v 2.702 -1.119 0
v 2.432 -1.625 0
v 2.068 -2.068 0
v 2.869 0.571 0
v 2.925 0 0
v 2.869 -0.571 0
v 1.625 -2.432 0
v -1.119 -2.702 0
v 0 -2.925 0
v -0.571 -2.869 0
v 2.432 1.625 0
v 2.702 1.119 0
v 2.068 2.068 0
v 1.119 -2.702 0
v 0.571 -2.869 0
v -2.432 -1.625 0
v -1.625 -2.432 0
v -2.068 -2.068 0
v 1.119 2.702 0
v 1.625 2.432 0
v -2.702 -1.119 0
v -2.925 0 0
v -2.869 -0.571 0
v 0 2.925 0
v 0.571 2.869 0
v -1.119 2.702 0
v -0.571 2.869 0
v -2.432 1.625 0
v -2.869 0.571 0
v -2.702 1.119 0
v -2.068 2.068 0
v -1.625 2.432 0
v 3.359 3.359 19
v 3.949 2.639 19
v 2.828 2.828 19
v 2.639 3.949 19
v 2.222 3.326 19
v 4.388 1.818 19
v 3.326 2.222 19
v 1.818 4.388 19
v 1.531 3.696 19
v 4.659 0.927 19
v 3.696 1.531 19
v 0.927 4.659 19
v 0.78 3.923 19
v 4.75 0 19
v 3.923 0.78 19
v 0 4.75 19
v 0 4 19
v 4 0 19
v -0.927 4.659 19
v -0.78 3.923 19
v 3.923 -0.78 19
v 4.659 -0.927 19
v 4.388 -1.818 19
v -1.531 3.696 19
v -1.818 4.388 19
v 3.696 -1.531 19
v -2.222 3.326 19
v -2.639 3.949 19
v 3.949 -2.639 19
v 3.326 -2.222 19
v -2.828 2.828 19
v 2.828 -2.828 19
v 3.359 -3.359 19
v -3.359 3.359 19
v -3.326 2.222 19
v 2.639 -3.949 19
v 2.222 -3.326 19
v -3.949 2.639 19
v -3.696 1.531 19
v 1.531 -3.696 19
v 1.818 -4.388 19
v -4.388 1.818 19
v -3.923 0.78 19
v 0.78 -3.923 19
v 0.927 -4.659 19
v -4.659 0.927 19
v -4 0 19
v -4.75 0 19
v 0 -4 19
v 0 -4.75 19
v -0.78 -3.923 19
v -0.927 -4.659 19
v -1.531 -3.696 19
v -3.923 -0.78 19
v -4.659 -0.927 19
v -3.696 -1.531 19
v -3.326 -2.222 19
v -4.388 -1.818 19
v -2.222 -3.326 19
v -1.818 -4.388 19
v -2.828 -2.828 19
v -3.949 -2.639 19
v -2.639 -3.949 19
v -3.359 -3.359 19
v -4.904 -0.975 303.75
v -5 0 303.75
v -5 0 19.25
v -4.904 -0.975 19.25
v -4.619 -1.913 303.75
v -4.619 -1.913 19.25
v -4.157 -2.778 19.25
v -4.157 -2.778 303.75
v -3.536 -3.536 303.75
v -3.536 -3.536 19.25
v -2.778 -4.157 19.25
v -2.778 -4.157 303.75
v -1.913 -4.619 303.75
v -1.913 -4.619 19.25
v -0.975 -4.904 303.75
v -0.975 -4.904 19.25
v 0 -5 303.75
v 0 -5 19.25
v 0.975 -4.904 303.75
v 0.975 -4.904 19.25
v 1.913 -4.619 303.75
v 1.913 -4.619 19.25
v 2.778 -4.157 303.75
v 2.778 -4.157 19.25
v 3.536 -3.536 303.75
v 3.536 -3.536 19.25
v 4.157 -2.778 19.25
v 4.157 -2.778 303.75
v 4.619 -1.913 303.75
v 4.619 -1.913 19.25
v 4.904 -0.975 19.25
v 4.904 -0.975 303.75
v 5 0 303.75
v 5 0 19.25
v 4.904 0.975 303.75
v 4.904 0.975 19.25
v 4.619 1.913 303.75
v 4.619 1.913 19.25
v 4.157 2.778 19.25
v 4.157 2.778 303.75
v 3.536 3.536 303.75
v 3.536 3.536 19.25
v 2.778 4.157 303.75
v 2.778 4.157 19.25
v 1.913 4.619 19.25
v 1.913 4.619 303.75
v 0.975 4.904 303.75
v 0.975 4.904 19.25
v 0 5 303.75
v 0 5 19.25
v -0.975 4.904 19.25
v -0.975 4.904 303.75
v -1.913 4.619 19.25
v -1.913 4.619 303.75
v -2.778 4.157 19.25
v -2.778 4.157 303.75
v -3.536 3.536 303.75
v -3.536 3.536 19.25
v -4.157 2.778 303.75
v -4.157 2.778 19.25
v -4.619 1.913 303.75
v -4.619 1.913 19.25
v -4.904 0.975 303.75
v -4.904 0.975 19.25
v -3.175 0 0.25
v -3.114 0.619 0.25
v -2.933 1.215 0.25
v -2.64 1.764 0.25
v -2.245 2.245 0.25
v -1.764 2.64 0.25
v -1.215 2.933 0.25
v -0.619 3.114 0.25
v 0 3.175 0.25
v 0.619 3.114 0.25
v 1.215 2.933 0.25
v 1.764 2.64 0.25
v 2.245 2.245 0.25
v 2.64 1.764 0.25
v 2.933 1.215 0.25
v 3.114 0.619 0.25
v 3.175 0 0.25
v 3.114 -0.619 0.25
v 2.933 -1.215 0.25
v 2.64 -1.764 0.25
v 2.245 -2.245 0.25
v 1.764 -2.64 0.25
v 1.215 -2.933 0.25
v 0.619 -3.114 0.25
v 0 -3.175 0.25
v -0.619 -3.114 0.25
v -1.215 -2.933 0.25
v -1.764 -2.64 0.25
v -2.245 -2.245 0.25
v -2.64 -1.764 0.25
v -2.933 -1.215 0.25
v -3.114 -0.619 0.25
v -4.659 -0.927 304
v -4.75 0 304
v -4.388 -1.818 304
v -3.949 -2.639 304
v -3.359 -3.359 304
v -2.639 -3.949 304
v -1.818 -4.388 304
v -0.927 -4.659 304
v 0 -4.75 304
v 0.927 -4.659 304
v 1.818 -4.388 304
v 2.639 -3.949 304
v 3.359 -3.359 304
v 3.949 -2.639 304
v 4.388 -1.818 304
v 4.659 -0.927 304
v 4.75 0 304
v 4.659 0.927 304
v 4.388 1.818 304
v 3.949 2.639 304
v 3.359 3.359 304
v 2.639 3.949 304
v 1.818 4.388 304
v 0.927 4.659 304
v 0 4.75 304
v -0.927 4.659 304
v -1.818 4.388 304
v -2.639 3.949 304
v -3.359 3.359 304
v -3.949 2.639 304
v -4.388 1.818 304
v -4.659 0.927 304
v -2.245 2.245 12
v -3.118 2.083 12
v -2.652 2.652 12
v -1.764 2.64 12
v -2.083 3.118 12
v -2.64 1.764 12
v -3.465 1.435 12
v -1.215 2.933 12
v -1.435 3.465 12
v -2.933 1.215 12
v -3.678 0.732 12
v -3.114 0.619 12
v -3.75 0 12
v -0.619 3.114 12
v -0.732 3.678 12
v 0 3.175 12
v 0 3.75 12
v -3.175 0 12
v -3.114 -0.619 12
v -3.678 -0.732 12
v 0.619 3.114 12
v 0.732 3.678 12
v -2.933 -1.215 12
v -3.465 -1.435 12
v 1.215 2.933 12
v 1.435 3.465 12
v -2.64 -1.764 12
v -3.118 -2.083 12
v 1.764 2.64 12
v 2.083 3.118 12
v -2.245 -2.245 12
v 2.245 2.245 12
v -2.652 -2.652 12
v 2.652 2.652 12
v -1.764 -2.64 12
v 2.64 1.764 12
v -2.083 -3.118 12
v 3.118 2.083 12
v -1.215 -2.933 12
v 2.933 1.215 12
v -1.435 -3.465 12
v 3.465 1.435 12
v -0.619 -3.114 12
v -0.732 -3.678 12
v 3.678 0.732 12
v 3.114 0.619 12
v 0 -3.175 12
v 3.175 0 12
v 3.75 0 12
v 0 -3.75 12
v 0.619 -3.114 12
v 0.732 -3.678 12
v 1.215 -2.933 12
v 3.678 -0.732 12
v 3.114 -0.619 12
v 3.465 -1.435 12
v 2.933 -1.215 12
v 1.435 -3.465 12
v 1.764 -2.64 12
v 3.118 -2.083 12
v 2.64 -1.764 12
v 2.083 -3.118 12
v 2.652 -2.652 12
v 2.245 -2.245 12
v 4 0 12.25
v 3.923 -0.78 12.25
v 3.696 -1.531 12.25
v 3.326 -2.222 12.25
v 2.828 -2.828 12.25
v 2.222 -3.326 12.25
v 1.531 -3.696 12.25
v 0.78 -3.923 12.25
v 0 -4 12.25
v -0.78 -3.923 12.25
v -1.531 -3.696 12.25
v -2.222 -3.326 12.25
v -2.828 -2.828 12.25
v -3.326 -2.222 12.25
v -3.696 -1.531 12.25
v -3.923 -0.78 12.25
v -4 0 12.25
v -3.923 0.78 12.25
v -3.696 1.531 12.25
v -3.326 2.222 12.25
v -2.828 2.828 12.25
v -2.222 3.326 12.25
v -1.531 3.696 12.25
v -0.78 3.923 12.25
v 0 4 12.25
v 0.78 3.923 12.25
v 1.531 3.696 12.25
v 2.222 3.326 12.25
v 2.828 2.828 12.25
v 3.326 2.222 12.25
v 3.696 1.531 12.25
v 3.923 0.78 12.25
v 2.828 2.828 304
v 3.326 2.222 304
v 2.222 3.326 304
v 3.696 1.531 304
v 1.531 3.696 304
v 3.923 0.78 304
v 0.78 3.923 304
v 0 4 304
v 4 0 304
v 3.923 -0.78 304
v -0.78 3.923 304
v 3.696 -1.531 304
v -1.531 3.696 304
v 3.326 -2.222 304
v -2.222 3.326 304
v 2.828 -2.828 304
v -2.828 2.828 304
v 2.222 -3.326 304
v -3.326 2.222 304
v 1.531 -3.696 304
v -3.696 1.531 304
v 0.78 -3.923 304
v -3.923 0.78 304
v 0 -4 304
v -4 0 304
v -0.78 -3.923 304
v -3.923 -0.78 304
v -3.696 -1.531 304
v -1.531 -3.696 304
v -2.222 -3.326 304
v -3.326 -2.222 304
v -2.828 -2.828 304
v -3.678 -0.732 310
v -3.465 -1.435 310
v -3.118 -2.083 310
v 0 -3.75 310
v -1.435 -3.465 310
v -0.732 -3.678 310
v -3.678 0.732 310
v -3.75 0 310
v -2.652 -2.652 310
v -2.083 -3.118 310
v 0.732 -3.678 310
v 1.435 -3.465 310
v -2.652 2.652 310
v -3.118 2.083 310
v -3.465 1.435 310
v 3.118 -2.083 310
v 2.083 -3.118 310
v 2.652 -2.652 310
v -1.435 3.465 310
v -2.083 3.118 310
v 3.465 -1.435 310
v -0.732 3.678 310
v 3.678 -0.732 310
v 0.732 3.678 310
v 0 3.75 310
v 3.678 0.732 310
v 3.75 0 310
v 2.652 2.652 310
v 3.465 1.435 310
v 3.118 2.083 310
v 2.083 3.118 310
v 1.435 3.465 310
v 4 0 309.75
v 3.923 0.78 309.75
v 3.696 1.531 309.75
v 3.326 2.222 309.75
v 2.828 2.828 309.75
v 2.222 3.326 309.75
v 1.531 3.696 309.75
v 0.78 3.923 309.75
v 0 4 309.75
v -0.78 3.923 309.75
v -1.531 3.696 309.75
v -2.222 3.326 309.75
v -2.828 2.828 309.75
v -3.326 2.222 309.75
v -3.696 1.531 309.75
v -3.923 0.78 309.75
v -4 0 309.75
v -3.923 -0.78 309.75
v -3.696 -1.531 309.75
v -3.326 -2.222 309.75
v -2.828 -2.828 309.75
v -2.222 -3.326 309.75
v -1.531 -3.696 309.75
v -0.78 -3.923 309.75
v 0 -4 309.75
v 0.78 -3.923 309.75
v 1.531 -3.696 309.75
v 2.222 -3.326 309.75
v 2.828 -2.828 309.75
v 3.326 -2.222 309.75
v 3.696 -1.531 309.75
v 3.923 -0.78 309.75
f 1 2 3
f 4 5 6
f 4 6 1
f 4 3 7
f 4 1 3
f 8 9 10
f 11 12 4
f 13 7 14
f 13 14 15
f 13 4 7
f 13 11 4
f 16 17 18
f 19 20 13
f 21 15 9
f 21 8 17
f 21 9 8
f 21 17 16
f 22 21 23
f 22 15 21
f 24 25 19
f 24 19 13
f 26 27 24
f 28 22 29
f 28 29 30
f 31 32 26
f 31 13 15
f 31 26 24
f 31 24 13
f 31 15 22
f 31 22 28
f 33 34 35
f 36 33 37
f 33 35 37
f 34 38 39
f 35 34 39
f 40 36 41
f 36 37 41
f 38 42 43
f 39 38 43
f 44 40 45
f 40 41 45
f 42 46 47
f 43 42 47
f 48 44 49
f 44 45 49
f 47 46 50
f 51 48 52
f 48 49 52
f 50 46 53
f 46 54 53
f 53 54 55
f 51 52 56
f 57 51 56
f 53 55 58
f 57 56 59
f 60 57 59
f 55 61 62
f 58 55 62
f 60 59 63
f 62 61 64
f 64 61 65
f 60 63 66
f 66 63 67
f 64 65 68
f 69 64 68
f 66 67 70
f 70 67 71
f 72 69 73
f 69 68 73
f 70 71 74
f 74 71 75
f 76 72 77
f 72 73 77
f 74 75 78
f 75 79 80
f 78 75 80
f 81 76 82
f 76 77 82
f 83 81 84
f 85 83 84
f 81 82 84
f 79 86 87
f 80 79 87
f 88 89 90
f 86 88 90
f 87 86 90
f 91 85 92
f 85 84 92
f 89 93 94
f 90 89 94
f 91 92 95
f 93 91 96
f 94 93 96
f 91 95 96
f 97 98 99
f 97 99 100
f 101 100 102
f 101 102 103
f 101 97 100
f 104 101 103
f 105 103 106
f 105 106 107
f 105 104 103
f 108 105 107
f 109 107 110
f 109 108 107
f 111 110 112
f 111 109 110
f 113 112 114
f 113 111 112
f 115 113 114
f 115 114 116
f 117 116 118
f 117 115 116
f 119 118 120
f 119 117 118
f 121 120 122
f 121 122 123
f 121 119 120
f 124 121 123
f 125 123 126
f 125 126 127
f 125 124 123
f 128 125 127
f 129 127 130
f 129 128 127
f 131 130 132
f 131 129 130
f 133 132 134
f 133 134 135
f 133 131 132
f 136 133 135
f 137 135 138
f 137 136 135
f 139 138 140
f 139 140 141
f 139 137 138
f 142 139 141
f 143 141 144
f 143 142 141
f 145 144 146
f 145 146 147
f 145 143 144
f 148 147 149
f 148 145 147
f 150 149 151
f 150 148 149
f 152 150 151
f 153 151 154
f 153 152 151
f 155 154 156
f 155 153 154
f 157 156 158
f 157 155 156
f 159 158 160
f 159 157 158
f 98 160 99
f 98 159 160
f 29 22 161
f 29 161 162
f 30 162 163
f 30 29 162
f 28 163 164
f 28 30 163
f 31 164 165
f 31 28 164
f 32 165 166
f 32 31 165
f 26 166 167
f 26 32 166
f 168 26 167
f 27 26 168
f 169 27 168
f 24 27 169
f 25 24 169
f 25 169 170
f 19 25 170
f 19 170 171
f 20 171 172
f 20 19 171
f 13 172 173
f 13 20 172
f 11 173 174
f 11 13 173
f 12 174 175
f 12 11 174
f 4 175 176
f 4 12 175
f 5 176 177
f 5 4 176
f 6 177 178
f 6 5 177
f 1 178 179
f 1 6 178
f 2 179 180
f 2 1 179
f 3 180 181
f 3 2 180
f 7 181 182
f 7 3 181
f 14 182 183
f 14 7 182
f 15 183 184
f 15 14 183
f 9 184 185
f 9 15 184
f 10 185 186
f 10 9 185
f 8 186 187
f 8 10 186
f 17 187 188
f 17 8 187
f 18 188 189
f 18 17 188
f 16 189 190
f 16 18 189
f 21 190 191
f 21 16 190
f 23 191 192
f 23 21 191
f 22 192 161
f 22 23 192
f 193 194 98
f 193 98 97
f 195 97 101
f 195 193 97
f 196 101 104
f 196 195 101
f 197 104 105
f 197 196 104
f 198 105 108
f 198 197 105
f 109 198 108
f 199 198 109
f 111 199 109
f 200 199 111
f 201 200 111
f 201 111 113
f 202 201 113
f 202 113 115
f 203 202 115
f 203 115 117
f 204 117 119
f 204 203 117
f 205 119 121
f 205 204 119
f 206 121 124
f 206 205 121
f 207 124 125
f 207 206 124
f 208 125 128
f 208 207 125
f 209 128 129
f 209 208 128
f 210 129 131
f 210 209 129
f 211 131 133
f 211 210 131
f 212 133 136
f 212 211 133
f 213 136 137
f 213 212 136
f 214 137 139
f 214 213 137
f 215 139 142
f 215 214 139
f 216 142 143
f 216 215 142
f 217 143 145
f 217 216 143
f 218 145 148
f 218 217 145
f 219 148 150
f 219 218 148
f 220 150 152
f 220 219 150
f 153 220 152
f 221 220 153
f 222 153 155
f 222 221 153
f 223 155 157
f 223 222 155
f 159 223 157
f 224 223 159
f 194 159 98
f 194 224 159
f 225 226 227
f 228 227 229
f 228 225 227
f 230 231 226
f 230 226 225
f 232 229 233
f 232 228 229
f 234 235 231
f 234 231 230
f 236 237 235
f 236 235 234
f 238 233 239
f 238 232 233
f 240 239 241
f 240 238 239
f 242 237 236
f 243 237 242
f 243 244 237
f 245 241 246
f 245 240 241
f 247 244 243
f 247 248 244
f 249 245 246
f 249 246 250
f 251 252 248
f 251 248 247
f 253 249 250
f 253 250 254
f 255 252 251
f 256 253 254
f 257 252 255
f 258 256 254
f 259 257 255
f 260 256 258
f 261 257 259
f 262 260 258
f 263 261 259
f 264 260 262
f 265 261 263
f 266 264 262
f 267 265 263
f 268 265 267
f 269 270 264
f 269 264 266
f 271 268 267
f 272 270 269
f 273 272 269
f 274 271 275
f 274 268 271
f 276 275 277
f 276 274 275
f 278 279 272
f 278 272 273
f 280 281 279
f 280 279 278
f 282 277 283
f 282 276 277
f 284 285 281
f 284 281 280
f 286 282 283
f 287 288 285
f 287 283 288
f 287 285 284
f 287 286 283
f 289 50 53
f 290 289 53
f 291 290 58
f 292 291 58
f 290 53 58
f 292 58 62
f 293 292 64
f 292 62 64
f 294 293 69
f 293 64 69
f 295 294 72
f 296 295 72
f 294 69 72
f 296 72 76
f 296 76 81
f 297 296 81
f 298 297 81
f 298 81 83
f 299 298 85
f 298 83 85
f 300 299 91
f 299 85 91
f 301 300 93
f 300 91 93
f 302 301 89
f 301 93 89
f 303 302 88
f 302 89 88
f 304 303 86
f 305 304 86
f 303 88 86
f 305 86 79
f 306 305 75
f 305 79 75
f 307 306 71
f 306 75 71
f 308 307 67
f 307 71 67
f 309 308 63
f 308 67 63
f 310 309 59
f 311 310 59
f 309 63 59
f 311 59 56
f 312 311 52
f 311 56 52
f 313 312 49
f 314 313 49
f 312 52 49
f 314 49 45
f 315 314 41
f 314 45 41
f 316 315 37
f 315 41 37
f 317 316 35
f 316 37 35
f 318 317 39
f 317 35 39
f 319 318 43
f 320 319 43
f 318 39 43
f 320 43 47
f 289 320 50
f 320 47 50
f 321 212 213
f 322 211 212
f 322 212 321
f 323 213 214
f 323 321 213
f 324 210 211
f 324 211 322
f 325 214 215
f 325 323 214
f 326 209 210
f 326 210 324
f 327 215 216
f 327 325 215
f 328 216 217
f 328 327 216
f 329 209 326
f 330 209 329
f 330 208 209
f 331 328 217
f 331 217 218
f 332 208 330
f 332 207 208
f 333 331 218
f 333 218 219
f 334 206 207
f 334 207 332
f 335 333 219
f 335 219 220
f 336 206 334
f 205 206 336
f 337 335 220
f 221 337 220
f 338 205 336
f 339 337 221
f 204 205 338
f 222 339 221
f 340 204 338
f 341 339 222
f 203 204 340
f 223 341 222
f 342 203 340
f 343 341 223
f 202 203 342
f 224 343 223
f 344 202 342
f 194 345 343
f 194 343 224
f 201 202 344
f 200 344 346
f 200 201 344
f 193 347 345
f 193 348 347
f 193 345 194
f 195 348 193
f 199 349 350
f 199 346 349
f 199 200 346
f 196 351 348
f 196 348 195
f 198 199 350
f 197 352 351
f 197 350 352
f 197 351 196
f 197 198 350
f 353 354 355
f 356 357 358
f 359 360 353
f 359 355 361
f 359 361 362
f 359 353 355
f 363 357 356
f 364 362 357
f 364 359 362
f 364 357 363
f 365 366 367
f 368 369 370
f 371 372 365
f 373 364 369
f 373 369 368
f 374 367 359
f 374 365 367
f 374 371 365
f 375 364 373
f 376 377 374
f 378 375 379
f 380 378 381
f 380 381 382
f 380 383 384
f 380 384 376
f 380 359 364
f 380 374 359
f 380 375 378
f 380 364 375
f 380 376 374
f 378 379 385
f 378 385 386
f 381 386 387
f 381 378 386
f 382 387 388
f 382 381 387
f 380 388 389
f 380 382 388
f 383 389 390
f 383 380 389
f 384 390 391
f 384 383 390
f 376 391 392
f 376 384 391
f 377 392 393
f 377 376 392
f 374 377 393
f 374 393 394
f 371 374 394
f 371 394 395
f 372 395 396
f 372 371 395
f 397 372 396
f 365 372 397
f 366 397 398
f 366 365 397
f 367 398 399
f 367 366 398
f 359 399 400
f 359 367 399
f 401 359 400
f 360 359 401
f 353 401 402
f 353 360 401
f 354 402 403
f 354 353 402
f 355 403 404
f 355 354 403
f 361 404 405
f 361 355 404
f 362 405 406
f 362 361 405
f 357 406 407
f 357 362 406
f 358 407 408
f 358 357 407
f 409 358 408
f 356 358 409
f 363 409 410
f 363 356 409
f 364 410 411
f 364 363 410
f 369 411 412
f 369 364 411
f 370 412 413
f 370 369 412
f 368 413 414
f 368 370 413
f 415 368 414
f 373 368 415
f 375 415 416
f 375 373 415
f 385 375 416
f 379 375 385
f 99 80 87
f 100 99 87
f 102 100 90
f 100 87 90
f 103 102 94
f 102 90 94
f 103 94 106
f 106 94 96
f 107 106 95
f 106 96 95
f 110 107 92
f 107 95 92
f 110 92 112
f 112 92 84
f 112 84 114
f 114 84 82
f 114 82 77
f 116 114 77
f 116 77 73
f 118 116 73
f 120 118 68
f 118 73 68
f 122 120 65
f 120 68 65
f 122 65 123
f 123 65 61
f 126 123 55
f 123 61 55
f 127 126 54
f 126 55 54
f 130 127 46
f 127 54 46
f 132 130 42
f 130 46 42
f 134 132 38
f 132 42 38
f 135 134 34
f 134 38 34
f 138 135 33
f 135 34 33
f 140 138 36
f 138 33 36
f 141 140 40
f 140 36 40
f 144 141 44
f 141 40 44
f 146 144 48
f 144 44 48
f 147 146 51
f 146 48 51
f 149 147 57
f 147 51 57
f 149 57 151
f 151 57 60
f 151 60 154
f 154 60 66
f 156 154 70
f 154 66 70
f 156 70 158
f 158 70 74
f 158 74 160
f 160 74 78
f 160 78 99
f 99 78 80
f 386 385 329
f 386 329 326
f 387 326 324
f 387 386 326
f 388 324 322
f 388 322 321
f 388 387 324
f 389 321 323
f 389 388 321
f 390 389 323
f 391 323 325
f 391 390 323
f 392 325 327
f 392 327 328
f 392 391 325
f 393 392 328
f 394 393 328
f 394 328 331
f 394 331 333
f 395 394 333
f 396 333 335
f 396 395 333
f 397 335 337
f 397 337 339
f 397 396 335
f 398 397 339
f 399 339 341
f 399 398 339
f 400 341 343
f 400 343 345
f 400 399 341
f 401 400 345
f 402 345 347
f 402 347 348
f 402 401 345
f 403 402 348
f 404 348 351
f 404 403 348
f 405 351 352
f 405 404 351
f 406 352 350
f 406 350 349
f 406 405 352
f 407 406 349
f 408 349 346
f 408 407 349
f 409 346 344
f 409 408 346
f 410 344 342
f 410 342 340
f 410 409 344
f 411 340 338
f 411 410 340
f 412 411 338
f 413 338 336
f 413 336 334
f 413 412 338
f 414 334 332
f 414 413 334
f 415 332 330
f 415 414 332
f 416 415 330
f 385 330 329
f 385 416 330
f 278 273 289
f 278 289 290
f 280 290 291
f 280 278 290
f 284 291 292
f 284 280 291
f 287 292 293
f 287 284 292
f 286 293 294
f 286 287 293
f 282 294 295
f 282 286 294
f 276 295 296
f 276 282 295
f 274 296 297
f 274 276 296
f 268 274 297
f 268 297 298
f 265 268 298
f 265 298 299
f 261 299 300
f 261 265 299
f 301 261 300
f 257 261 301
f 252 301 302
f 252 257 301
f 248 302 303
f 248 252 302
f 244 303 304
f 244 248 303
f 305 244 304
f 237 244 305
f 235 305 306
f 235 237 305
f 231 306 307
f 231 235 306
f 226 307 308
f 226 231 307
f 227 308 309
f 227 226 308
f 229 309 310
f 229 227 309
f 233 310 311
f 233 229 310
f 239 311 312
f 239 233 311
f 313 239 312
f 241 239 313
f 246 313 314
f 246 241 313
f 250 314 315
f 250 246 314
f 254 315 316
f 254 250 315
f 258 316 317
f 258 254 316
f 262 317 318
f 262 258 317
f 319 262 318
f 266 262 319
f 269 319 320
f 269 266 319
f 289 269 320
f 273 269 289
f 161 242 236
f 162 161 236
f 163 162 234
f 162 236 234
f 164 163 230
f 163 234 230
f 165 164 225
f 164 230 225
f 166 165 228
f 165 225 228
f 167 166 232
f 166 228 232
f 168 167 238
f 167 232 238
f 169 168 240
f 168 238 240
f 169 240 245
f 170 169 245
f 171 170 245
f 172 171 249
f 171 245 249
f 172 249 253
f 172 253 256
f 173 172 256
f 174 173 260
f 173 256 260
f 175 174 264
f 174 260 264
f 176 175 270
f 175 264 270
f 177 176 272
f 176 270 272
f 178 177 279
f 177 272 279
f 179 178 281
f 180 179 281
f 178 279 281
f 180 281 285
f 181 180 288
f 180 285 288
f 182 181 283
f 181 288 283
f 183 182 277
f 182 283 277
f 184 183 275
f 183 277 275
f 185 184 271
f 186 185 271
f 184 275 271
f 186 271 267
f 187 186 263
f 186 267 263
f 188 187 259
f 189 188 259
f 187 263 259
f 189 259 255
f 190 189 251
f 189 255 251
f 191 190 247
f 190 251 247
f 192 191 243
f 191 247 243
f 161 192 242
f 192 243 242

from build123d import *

# Parameters (mm, degrees)
SKETCH1_R           = 5
BOSS_EXTRUDE1_DEPTH = 285
SKETCH2_R           = 4
BOSS_EXTRUDE2_DEPTH = 7
SKETCH3_R           = 3.175
BOSS_EXTRUDE3_DEPTH = 12
BOSS_EXTRUDE4_START = 6
SKETCH4_R           = 4
BOSS_EXTRUDE4_DEPTH = 6
CHAMFER1_SIZE       = 0.25


with BuildPart() as part:
    # Sketch1 → Boss-Extrude1 (new body)
    with BuildSketch(Plane.XY.offset(304)):
        with Locations(Location((0, 0, 0), (0, 0, 180))):
            Circle(SKETCH1_R)
    extrude(amount=-BOSS_EXTRUDE1_DEPTH)

    # Sketch2 → Boss-Extrude2 (add)
    with BuildSketch(Plane(origin=(0, 0, 19), x_dir=(-1, 0, 0), z_dir=(0, 0, -1))):
        with Locations(Location((0, 0, 0), (0, 0, 180))):
            Circle(SKETCH2_R)
    extrude(amount=BOSS_EXTRUDE2_DEPTH)

    # Sketch3 → Boss-Extrude3 (add)
    with BuildSketch(Plane(origin=(0, 0, 12), x_dir=(-1, 0, 0), z_dir=(0, 0, -1))):
        Circle(SKETCH3_R)
    extrude(amount=BOSS_EXTRUDE3_DEPTH)

    # Sketch4 → Boss-Extrude4 (add)
    with BuildSketch(Plane.XY.offset(304).offset(BOSS_EXTRUDE4_START)):
        Circle(SKETCH4_R)
    extrude(amount=-BOSS_EXTRUDE4_DEPTH)

    # Chamfer1
    chamfer1_edges = [part.edges().sort_by_distance(p)[0] for p in [
        (3.175, 0, 0),
        (-4, 0, 310),
        (5, 0, 304),
        (5, 0, 19),
        (-4, 0, 12),
    ]]
    chamfer(chamfer1_edges, length=CHAMFER1_SIZE)


solid = part.part
